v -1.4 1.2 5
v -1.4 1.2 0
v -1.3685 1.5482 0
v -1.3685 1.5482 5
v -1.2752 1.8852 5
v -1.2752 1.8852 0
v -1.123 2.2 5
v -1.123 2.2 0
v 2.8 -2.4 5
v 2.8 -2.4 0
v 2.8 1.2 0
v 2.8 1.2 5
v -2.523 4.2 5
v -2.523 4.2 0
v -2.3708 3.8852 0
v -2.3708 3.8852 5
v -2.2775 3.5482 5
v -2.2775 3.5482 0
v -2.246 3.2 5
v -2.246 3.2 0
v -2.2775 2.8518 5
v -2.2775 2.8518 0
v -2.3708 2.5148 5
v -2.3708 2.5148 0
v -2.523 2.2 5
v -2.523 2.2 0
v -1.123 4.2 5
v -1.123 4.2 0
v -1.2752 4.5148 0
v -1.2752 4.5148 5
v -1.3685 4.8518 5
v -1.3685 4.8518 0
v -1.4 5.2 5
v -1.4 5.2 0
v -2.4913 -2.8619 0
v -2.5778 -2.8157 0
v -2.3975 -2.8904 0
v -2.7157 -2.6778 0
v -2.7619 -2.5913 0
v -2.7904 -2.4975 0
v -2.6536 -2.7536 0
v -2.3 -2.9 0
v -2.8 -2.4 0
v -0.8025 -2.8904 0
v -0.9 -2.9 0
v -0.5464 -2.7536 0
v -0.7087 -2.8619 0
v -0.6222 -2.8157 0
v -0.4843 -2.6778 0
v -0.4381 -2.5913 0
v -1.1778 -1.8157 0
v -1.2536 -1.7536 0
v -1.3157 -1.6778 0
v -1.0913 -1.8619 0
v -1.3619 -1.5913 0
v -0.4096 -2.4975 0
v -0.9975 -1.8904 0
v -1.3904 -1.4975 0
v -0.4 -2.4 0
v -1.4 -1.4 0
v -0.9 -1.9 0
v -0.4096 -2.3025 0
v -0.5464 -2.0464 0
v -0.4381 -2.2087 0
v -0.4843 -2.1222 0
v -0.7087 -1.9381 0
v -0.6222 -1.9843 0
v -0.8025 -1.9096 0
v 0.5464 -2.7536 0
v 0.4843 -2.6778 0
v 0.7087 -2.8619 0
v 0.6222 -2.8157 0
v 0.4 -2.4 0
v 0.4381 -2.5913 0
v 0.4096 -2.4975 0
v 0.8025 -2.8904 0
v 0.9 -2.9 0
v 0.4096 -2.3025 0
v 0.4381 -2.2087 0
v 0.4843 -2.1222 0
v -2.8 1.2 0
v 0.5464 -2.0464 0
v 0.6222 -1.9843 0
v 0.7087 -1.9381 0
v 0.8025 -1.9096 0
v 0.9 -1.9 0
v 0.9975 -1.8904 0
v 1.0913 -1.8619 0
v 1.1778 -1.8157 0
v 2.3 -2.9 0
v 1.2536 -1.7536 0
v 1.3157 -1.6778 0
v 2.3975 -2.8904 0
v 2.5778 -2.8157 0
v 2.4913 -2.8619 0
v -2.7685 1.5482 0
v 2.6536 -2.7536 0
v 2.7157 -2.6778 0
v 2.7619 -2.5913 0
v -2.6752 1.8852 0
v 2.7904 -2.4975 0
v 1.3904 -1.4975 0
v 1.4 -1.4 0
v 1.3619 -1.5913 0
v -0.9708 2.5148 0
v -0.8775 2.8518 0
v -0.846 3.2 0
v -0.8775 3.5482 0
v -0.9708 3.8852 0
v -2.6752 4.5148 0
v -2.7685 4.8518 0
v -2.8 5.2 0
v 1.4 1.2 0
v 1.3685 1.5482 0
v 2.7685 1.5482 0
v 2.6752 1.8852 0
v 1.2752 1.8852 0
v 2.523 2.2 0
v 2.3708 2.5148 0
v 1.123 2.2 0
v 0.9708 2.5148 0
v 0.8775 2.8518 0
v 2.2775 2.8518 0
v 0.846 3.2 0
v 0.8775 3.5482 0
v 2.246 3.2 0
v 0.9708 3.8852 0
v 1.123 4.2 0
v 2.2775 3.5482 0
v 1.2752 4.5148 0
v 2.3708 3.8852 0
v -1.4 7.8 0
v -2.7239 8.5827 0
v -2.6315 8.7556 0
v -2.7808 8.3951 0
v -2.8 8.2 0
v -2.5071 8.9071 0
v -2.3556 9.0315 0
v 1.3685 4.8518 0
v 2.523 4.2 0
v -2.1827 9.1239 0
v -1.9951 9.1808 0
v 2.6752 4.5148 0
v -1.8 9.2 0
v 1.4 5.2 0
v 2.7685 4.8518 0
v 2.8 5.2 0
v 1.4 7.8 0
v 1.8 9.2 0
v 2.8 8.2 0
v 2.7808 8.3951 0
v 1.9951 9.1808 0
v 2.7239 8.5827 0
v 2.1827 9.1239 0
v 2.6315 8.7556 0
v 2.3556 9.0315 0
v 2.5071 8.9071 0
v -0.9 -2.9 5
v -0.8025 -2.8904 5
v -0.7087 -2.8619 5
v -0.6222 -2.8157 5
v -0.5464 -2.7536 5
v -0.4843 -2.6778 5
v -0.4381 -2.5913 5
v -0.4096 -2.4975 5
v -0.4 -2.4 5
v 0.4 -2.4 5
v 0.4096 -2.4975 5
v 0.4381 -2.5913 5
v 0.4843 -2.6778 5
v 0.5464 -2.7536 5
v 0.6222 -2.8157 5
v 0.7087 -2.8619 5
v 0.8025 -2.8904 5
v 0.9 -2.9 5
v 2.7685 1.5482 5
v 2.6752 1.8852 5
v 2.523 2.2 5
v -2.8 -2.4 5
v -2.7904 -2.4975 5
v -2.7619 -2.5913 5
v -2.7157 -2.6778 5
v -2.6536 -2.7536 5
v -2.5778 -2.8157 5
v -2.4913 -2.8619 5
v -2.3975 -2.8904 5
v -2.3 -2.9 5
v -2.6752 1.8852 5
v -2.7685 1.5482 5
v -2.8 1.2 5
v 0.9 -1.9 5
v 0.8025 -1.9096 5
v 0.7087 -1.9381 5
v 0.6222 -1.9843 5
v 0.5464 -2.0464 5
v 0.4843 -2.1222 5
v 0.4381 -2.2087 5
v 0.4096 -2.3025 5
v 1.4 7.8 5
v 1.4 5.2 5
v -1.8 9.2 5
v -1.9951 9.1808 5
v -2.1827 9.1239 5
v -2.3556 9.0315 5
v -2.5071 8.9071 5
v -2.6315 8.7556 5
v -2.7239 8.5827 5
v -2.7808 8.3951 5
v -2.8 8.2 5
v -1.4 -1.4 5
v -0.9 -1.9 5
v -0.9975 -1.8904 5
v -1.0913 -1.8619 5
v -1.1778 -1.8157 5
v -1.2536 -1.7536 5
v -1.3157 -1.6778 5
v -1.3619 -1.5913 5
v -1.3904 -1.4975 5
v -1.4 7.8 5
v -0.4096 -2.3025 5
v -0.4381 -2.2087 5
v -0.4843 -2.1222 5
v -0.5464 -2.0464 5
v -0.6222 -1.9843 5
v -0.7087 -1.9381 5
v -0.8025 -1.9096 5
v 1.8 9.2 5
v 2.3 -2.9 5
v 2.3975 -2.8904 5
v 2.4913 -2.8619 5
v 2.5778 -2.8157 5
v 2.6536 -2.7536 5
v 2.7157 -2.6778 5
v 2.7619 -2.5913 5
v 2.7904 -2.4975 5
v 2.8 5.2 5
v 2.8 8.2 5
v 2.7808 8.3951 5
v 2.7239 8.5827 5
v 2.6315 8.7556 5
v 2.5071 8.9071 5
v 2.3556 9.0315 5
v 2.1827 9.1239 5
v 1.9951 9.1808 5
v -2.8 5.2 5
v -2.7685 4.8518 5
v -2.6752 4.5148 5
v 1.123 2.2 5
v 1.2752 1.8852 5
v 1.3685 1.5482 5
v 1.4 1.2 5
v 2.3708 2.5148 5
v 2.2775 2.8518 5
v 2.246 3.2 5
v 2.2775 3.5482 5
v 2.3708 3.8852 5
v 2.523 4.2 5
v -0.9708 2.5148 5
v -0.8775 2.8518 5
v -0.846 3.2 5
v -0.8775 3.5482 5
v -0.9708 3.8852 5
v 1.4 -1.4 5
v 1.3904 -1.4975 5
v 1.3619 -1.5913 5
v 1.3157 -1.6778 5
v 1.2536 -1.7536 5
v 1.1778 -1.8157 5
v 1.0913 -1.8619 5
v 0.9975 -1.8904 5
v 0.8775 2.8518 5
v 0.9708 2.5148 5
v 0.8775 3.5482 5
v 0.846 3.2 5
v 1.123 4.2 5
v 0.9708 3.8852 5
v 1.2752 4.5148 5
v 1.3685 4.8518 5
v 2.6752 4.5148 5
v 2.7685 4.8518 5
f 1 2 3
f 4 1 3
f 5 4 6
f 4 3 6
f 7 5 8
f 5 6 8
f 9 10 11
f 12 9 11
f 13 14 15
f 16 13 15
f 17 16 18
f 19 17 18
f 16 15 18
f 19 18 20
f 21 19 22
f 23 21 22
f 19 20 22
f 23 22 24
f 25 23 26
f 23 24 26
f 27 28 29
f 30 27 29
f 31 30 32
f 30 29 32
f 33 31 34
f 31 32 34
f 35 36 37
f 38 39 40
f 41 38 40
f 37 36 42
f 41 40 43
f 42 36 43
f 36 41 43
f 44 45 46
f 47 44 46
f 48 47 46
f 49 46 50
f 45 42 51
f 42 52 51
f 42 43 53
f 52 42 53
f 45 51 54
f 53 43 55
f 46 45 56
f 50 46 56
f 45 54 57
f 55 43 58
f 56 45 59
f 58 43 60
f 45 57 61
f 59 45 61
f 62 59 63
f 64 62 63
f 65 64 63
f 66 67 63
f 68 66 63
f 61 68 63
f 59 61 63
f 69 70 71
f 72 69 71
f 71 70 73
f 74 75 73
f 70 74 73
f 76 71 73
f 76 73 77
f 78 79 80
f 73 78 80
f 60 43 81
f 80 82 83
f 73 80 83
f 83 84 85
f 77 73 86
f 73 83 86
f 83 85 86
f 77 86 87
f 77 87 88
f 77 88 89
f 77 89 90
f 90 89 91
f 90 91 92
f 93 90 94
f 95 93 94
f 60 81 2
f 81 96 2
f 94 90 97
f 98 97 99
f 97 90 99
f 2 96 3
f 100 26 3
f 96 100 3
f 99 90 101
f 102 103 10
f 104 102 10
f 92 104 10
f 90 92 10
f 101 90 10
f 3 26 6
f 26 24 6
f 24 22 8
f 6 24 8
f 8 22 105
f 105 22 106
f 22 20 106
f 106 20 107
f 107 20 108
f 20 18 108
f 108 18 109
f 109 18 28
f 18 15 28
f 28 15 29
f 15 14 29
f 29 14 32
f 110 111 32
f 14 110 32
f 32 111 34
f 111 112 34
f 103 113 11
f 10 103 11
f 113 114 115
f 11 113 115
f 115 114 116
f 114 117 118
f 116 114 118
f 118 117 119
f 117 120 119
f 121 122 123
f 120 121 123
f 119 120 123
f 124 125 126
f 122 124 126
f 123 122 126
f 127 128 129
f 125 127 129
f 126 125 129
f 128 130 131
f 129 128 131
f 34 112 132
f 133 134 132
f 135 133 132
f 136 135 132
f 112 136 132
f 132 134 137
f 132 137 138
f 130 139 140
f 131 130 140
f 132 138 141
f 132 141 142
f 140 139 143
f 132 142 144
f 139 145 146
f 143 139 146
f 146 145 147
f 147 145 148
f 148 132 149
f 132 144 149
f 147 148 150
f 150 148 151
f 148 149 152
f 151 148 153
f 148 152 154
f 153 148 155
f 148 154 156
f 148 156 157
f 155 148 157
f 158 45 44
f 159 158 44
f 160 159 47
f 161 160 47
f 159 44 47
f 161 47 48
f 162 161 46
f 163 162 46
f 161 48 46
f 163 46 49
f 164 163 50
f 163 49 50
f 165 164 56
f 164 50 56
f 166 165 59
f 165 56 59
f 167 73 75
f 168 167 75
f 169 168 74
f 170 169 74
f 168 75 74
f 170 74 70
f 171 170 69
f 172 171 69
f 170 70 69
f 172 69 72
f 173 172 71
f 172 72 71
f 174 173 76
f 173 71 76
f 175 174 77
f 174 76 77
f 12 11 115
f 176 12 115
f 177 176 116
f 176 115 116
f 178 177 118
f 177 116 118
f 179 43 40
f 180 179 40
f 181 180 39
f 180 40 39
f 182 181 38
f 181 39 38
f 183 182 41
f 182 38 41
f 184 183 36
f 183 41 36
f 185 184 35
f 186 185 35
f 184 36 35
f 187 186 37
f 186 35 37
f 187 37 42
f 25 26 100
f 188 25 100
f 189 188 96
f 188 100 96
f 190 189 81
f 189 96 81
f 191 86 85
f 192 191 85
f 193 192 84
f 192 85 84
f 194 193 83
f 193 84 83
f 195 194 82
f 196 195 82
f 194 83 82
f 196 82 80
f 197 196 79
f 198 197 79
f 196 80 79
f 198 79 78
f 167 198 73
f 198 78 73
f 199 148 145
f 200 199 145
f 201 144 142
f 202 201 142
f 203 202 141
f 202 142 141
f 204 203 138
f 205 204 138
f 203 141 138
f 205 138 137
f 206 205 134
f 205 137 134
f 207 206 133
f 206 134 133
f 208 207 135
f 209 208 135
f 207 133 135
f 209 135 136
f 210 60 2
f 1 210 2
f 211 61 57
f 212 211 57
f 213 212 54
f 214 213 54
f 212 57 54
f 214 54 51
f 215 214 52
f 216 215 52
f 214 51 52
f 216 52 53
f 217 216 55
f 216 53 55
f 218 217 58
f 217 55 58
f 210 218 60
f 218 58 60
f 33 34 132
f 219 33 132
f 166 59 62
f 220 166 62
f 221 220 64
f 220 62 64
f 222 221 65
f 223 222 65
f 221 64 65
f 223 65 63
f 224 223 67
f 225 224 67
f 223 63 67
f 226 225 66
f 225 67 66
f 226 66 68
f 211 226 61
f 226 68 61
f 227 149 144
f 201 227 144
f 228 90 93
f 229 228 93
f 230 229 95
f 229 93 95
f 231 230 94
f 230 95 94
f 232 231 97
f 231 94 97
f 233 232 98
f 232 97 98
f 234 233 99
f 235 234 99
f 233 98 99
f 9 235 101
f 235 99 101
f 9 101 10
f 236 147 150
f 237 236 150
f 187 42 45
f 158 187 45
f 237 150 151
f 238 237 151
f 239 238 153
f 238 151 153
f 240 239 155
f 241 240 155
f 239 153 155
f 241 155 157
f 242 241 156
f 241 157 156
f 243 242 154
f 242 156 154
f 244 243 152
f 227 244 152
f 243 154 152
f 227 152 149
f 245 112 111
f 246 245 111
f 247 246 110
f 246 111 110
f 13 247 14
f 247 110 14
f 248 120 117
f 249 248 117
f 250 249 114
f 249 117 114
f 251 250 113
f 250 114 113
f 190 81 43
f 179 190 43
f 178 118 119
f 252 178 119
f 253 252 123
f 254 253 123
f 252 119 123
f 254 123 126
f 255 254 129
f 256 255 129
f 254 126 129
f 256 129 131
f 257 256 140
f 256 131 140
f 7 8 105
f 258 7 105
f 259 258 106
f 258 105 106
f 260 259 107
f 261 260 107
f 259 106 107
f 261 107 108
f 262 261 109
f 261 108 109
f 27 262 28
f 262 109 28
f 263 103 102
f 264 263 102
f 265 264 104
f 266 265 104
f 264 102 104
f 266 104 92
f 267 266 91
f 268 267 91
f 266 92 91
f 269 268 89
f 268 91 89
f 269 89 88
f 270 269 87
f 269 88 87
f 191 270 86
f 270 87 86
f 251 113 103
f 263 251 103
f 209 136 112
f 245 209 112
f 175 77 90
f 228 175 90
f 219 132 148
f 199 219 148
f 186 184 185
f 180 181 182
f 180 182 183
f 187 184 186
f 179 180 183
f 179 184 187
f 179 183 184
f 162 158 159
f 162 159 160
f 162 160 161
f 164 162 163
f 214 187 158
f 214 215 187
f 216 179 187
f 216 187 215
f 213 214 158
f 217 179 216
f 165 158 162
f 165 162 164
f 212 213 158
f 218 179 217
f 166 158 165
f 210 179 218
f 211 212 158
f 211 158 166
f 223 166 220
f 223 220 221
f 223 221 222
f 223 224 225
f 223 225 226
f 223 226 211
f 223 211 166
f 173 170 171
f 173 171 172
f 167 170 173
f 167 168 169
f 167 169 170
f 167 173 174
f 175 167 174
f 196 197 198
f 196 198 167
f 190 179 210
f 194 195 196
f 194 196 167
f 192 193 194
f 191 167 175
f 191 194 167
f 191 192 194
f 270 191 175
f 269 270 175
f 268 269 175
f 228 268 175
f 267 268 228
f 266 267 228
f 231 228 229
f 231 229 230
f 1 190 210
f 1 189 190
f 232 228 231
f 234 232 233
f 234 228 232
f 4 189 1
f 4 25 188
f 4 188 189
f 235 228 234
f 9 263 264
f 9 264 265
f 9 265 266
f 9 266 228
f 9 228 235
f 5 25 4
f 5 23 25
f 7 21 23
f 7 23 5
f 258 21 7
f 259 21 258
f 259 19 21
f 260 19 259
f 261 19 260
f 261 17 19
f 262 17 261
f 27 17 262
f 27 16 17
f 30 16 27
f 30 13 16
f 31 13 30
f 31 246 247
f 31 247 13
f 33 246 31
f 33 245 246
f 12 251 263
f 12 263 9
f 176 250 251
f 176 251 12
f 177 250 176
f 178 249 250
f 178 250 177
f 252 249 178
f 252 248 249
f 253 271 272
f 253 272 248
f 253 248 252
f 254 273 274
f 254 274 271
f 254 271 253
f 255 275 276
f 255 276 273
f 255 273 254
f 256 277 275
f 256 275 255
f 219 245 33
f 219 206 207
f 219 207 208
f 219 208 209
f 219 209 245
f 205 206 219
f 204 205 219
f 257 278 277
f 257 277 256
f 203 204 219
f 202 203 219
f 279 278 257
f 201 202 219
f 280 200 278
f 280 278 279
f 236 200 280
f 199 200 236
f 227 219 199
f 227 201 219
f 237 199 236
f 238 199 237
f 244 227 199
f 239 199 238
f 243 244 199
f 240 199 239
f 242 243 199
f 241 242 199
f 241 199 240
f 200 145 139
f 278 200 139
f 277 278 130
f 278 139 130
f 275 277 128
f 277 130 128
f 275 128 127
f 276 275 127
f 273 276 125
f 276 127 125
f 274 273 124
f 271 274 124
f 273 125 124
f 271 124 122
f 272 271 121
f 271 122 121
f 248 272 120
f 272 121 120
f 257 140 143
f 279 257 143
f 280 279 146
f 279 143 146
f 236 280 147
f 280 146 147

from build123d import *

# Parameters (mm, degrees)
BOSS_EXTRUDE1_DEPTH = 5


with BuildPart() as part:
    # Sketch2 → Boss-Extrude1 (new body)
    with BuildSketch(Plane.XY):
        with BuildLine():
            Line((-1.4, 7.8), (1.4, 7.8))
            Line((1.4, 7.8), (1.4, 5.2))
            ThreePointArc((1.4, 5.2), (1.329474497, 4.681174375), (1.123016035, 4.2))
            ThreePointArc((1.123016035, 4.2), (0.84603207, 3.2), (1.123016035, 2.2))
            ThreePointArc((1.123016035, 2.2), (1.329474497, 1.718825625), (1.4, 1.2))
            Line((1.4, 1.2), (1.4, -1.4))
            ThreePointArc((1.4, -1.4), (1.253553391, -1.753553391), (0.9, -1.9))
            ThreePointArc((0.9, -1.9), (0.546446609, -2.046446609), (0.4, -2.4))
            ThreePointArc((0.4, -2.4), (0.546446609, -2.753553391), (0.9, -2.9))
            Line((0.9, -2.9), (2.3, -2.9))
            ThreePointArc((2.3, -2.9), (2.653553391, -2.753553391), (2.8, -2.4))
            Line((2.8, -2.4), (2.8, 1.2))
            ThreePointArc((2.8, 1.2), (2.729474497, 1.718825625), (2.523016035, 2.2))
            ThreePointArc((2.523016035, 2.2), (2.24603207, 3.2), (2.523016035, 4.2))
            ThreePointArc((2.523016035, 4.2), (2.729474497, 4.681174375), (2.8, 5.2))
            Line((2.8, 5.2), (2.8, 8.2))
            ThreePointArc((2.8, 8.2), (2.507106781, 8.907106781), (1.8, 9.2))
            Line((1.8, 9.2), (-1.8, 9.2))
            ThreePointArc((-1.8, 9.2), (-2.507106781, 8.907106781), (-2.8, 8.2))
            Line((-2.8, 8.2), (-2.8, 5.2))
            ThreePointArc((-2.8, 5.2), (-2.729474497, 4.681174375), (-2.523016035, 4.2))
            ThreePointArc((-2.523016035, 4.2), (-2.24603207, 3.2), (-2.523016035, 2.2))
            ThreePointArc((-2.523016035, 2.2), (-2.729474497, 1.718825625), (-2.8, 1.2))
            Line((-2.8, 1.2), (-2.8, -2.4))
            ThreePointArc((-2.8, -2.4), (-2.653553391, -2.753553391), (-2.3, -2.9))
            Line((-2.3, -2.9), (-0.9, -2.9))
            ThreePointArc((-0.9, -2.9), (-0.546446609, -2.753553391), (-0.4, -2.4))
            ThreePointArc((-0.4, -2.4), (-0.546446609, -2.046446609), (-0.9, -1.9))
            ThreePointArc((-0.9, -1.9), (-1.253553391, -1.753553391), (-1.4, -1.4))
            Line((-1.4, -1.4), (-1.4, 1.2))
            ThreePointArc((-1.4, 1.2), (-1.329474497, 1.718825625), (-1.123016035, 2.2))
            ThreePointArc((-1.123016035, 2.2), (-0.84603207, 3.2), (-1.123016035, 4.2))
            ThreePointArc((-1.123016035, 4.2), (-1.329474497, 4.681174375), (-1.4, 5.2))
            Line((-1.4, 5.2), (-1.4, 7.8))
        make_face()
    extrude(amount=BOSS_EXTRUDE1_DEPTH)


solid = part.part
